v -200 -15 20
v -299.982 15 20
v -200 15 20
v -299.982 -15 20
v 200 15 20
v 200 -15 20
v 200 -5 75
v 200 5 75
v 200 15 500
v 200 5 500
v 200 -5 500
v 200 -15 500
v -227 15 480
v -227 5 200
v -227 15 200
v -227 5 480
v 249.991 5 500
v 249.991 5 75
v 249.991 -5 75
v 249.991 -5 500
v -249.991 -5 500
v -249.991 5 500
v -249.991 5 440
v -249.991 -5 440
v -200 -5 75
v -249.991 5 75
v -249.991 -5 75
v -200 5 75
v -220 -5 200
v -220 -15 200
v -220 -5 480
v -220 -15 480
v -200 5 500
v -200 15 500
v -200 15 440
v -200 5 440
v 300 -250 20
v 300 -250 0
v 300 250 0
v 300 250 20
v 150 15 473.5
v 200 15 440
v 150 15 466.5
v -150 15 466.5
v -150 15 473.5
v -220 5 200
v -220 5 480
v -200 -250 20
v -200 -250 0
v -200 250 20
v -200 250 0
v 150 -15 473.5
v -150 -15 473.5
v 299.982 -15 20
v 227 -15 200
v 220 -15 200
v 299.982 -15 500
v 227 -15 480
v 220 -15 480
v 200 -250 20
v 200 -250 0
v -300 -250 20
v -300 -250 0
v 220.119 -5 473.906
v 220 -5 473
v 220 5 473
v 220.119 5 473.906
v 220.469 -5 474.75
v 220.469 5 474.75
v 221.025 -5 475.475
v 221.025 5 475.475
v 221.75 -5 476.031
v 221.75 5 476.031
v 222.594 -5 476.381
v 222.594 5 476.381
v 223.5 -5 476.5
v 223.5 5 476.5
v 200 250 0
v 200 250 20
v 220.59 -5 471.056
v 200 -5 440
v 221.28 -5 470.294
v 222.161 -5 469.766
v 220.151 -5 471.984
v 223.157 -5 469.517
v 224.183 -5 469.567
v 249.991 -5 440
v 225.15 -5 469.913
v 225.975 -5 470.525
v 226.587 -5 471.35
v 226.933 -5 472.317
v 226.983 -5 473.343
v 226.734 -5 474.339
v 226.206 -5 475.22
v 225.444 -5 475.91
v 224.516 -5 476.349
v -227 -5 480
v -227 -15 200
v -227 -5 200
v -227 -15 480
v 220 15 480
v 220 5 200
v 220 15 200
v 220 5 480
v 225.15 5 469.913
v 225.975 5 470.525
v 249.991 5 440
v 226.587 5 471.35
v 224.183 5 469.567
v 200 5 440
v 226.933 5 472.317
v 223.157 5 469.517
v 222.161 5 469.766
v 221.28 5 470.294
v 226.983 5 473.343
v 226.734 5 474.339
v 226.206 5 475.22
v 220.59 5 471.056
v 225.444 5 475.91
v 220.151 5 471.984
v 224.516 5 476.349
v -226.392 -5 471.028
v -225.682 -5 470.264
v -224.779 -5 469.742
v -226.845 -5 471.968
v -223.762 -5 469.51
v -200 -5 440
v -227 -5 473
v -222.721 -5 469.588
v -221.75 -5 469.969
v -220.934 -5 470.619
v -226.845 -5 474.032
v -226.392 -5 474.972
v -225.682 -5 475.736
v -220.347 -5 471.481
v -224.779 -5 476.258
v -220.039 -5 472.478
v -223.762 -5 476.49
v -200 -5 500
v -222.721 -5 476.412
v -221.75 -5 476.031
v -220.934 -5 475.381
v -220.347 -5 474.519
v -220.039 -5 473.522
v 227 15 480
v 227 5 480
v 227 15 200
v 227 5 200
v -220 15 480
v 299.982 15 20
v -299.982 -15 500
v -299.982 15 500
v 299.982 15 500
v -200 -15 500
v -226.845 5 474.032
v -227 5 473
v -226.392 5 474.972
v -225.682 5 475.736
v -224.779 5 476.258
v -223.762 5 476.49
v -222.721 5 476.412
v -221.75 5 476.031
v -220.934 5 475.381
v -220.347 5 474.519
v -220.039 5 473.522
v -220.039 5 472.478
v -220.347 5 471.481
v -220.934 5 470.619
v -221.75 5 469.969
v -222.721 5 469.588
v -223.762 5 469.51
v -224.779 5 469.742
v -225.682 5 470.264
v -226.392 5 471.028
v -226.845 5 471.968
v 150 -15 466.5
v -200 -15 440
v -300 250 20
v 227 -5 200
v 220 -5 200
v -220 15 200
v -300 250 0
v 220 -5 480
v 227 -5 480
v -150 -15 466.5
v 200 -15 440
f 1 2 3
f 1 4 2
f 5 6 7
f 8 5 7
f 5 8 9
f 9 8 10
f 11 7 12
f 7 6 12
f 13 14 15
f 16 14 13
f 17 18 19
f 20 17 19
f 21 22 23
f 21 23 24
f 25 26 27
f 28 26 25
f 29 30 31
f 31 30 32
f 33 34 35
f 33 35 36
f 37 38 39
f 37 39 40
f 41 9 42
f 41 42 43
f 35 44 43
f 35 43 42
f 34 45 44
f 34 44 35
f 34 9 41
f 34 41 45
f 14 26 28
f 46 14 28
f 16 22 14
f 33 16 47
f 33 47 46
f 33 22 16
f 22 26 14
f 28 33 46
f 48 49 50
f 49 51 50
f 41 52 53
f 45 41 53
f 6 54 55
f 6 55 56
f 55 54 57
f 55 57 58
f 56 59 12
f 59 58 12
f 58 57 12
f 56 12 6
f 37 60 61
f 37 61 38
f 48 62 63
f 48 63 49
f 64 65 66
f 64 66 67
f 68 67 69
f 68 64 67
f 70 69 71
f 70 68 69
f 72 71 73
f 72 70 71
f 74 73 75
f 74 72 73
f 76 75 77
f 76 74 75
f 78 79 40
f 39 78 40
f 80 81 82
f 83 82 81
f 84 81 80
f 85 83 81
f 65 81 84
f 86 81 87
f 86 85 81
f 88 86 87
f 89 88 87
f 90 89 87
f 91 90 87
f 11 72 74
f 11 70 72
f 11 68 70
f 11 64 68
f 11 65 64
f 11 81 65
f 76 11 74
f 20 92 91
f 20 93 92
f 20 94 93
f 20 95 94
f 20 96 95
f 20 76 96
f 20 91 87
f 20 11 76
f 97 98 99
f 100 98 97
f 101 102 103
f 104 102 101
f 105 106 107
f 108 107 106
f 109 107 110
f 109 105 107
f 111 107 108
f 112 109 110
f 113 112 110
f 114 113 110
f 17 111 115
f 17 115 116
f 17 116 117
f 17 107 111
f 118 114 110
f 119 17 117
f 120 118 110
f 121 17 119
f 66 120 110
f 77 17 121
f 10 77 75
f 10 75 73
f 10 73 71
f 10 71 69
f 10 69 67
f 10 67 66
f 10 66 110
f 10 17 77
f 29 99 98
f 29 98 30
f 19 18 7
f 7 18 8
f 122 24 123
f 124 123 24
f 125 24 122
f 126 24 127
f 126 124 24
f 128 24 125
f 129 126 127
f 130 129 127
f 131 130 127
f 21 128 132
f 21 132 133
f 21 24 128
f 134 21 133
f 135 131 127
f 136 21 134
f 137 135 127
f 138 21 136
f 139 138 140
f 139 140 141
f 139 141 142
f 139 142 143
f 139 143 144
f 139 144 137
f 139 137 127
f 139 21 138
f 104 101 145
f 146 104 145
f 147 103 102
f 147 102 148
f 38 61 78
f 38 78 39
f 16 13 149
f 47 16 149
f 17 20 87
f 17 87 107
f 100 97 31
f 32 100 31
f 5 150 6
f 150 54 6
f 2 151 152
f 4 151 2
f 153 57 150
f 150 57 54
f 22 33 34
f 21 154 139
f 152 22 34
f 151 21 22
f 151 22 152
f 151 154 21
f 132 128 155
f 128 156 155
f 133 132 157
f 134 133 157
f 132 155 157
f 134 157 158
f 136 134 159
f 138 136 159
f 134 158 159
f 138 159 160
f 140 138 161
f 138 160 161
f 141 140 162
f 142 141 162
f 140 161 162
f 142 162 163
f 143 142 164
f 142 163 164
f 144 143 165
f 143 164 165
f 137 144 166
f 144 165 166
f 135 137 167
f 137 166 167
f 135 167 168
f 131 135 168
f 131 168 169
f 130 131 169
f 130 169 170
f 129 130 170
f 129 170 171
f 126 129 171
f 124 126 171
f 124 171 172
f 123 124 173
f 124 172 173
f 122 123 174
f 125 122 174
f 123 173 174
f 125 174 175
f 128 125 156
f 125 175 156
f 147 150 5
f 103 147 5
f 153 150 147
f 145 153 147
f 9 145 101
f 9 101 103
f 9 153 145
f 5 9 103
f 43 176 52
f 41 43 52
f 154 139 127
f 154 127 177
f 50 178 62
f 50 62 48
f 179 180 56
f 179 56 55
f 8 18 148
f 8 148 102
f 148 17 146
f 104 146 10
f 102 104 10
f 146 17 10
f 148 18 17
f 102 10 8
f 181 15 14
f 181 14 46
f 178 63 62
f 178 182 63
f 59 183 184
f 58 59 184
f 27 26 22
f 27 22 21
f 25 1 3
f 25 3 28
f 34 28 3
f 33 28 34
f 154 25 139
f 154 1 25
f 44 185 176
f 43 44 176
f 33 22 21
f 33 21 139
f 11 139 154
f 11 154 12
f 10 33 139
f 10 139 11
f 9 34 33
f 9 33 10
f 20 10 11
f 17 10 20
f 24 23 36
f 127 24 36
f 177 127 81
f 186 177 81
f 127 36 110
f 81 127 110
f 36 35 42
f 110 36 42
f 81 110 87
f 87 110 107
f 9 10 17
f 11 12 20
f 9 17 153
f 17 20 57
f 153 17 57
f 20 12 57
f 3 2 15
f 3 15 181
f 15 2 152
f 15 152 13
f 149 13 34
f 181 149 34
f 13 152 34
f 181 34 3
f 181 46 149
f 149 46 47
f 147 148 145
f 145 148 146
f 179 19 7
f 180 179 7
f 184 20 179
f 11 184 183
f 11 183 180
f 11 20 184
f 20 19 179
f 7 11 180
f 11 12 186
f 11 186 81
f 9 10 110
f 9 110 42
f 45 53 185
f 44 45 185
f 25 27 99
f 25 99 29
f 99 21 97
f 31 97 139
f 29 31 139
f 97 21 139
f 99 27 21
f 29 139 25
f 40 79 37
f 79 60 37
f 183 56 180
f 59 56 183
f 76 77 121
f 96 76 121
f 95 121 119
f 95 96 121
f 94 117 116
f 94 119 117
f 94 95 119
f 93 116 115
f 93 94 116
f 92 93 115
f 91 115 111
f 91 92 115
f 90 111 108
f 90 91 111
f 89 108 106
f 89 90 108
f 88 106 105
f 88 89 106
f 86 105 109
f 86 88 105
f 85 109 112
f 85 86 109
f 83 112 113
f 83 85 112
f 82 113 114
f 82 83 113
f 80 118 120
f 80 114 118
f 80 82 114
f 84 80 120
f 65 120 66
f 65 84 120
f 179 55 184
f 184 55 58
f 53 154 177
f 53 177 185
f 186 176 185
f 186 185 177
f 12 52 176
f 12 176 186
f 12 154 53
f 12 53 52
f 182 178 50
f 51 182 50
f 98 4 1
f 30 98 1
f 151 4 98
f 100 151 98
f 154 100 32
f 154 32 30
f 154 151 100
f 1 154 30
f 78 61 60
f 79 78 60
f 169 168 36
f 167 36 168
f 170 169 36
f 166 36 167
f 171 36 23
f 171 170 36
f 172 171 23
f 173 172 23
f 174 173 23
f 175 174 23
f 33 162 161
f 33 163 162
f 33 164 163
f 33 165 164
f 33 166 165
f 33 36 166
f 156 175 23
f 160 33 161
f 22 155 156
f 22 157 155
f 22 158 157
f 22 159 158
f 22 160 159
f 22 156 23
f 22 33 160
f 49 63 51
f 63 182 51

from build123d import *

# Parameters (mm, degrees)
F0_W      = 100
F0_H      = 20
F1_DEPTH  = 250
F3_DEPTH  = 15
F4_W      = 49.990886
F4_H      = 5
F5_DEPTH  = 425
F7_W      = 7
F7_H      = 280
F8_DEPTH  = 110
F10_DEPTH = 60
F11_R     = 3.5
F12_DEPTH = 56
F14_DEPTH = 46


with BuildPart() as f1:
    # F0 (on Front) → F1 (new body, symmetric)
    with BuildSketch(Plane.XZ):
        with Locations((-250, 10)):
            Rectangle(F0_W, F0_H)
        with Locations((250, 10)):
            Rectangle(F0_W, F0_H)
    extrude(amount=F1_DEPTH, both=True)


with BuildPart() as f3:
    # F2 (on Front) → F3 (new body, symmetric)
    with BuildSketch(Plane.XZ):
        Polygon((-299.981773, 20), (-200, 20), (-200, 229), (-200, 500), (-299.981773, 500), (-299.981773, 305), align=None)
    extrude(amount=F3_DEPTH, both=True)

    # F4 (on face) → F5 (cut)
    with BuildSketch(Plane.XY.offset(500)):
        with Locations((-224.995443, -2.5)):
            Rectangle(F4_W, F4_H)
        with Locations((-224.995443, 2.5)):
            Rectangle(F4_W, F4_H)
    extrude(amount=-F5_DEPTH, mode=Mode.SUBTRACT)


with BuildPart() as f6_1:
    # F6: instance of F3
    add(f3.part.mirror(Plane.YZ))


with BuildPart() as f8_tool:
    # F7 (on face) → F8 (new body)
    with BuildSketch(Plane.XZ.offset(15)):
        with Locations((-223.5, 340)):
            Rectangle(F7_W, F7_H)
        with Locations((223.5, 340)):
            Rectangle(F7_W, F7_H)
    extrude(amount=-F8_DEPTH)


with BuildPart() as f3_1:
    add(f3.part)

    # F8: cut by f8_tool
    add(f8_tool.part, mode=Mode.SUBTRACT)


with BuildPart() as f6_1_1:
    add(f6_1.part)

    # F8: cut by f8_tool
    add(f8_tool.part, mode=Mode.SUBTRACT)


with BuildPart() as f10:
    # F9 (on face) → F10 (new body)
    with BuildSketch(Plane.XY.offset(500)):
        Polygon((-200, -5), (-200, -15), (0, -15), (200, -15), (200, -5), (249.990886, -5), (249.990886, 5), (200, 5), (200, 15), (0, 15), (-200, 15), (-200, 5), (-249.990886, 5), (-249.990886, -5), align=None)
    extrude(amount=-F10_DEPTH)

    # F11 (on face) → F12 (cut, symmetric)
    with BuildSketch(Plane(origin=(0, 5, 0), x_dir=(-1, 0, 0), z_dir=(0, 1, 0))):
        with BuildLine():
            ThreePointArc((-220, 473), (-221.025126, 475.474874), (-223.5, 476.5))
            ThreePointArc((-223.5, 476.5), (-225.974874, 470.525126), (-220, 473))
        make_face()
        with Locations((223.5, 473)):
            Circle(F11_R)
    extrude(amount=F12_DEPTH, both=True, mode=Mode.SUBTRACT)

    # F13 (on face) → F14 (cut)
    with BuildSketch(Plane.XZ.offset(15)):
        Polygon((-150, 473.5), (-150, 470), (-150, 466.5), (0, 466.5), (150, 466.5), (150, 473.5), (0, 473.5), align=None)
    extrude(amount=-F14_DEPTH, mode=Mode.SUBTRACT)


solid = Compound([f1.part, f3_1.part, f6_1_1.part, f10.part])
